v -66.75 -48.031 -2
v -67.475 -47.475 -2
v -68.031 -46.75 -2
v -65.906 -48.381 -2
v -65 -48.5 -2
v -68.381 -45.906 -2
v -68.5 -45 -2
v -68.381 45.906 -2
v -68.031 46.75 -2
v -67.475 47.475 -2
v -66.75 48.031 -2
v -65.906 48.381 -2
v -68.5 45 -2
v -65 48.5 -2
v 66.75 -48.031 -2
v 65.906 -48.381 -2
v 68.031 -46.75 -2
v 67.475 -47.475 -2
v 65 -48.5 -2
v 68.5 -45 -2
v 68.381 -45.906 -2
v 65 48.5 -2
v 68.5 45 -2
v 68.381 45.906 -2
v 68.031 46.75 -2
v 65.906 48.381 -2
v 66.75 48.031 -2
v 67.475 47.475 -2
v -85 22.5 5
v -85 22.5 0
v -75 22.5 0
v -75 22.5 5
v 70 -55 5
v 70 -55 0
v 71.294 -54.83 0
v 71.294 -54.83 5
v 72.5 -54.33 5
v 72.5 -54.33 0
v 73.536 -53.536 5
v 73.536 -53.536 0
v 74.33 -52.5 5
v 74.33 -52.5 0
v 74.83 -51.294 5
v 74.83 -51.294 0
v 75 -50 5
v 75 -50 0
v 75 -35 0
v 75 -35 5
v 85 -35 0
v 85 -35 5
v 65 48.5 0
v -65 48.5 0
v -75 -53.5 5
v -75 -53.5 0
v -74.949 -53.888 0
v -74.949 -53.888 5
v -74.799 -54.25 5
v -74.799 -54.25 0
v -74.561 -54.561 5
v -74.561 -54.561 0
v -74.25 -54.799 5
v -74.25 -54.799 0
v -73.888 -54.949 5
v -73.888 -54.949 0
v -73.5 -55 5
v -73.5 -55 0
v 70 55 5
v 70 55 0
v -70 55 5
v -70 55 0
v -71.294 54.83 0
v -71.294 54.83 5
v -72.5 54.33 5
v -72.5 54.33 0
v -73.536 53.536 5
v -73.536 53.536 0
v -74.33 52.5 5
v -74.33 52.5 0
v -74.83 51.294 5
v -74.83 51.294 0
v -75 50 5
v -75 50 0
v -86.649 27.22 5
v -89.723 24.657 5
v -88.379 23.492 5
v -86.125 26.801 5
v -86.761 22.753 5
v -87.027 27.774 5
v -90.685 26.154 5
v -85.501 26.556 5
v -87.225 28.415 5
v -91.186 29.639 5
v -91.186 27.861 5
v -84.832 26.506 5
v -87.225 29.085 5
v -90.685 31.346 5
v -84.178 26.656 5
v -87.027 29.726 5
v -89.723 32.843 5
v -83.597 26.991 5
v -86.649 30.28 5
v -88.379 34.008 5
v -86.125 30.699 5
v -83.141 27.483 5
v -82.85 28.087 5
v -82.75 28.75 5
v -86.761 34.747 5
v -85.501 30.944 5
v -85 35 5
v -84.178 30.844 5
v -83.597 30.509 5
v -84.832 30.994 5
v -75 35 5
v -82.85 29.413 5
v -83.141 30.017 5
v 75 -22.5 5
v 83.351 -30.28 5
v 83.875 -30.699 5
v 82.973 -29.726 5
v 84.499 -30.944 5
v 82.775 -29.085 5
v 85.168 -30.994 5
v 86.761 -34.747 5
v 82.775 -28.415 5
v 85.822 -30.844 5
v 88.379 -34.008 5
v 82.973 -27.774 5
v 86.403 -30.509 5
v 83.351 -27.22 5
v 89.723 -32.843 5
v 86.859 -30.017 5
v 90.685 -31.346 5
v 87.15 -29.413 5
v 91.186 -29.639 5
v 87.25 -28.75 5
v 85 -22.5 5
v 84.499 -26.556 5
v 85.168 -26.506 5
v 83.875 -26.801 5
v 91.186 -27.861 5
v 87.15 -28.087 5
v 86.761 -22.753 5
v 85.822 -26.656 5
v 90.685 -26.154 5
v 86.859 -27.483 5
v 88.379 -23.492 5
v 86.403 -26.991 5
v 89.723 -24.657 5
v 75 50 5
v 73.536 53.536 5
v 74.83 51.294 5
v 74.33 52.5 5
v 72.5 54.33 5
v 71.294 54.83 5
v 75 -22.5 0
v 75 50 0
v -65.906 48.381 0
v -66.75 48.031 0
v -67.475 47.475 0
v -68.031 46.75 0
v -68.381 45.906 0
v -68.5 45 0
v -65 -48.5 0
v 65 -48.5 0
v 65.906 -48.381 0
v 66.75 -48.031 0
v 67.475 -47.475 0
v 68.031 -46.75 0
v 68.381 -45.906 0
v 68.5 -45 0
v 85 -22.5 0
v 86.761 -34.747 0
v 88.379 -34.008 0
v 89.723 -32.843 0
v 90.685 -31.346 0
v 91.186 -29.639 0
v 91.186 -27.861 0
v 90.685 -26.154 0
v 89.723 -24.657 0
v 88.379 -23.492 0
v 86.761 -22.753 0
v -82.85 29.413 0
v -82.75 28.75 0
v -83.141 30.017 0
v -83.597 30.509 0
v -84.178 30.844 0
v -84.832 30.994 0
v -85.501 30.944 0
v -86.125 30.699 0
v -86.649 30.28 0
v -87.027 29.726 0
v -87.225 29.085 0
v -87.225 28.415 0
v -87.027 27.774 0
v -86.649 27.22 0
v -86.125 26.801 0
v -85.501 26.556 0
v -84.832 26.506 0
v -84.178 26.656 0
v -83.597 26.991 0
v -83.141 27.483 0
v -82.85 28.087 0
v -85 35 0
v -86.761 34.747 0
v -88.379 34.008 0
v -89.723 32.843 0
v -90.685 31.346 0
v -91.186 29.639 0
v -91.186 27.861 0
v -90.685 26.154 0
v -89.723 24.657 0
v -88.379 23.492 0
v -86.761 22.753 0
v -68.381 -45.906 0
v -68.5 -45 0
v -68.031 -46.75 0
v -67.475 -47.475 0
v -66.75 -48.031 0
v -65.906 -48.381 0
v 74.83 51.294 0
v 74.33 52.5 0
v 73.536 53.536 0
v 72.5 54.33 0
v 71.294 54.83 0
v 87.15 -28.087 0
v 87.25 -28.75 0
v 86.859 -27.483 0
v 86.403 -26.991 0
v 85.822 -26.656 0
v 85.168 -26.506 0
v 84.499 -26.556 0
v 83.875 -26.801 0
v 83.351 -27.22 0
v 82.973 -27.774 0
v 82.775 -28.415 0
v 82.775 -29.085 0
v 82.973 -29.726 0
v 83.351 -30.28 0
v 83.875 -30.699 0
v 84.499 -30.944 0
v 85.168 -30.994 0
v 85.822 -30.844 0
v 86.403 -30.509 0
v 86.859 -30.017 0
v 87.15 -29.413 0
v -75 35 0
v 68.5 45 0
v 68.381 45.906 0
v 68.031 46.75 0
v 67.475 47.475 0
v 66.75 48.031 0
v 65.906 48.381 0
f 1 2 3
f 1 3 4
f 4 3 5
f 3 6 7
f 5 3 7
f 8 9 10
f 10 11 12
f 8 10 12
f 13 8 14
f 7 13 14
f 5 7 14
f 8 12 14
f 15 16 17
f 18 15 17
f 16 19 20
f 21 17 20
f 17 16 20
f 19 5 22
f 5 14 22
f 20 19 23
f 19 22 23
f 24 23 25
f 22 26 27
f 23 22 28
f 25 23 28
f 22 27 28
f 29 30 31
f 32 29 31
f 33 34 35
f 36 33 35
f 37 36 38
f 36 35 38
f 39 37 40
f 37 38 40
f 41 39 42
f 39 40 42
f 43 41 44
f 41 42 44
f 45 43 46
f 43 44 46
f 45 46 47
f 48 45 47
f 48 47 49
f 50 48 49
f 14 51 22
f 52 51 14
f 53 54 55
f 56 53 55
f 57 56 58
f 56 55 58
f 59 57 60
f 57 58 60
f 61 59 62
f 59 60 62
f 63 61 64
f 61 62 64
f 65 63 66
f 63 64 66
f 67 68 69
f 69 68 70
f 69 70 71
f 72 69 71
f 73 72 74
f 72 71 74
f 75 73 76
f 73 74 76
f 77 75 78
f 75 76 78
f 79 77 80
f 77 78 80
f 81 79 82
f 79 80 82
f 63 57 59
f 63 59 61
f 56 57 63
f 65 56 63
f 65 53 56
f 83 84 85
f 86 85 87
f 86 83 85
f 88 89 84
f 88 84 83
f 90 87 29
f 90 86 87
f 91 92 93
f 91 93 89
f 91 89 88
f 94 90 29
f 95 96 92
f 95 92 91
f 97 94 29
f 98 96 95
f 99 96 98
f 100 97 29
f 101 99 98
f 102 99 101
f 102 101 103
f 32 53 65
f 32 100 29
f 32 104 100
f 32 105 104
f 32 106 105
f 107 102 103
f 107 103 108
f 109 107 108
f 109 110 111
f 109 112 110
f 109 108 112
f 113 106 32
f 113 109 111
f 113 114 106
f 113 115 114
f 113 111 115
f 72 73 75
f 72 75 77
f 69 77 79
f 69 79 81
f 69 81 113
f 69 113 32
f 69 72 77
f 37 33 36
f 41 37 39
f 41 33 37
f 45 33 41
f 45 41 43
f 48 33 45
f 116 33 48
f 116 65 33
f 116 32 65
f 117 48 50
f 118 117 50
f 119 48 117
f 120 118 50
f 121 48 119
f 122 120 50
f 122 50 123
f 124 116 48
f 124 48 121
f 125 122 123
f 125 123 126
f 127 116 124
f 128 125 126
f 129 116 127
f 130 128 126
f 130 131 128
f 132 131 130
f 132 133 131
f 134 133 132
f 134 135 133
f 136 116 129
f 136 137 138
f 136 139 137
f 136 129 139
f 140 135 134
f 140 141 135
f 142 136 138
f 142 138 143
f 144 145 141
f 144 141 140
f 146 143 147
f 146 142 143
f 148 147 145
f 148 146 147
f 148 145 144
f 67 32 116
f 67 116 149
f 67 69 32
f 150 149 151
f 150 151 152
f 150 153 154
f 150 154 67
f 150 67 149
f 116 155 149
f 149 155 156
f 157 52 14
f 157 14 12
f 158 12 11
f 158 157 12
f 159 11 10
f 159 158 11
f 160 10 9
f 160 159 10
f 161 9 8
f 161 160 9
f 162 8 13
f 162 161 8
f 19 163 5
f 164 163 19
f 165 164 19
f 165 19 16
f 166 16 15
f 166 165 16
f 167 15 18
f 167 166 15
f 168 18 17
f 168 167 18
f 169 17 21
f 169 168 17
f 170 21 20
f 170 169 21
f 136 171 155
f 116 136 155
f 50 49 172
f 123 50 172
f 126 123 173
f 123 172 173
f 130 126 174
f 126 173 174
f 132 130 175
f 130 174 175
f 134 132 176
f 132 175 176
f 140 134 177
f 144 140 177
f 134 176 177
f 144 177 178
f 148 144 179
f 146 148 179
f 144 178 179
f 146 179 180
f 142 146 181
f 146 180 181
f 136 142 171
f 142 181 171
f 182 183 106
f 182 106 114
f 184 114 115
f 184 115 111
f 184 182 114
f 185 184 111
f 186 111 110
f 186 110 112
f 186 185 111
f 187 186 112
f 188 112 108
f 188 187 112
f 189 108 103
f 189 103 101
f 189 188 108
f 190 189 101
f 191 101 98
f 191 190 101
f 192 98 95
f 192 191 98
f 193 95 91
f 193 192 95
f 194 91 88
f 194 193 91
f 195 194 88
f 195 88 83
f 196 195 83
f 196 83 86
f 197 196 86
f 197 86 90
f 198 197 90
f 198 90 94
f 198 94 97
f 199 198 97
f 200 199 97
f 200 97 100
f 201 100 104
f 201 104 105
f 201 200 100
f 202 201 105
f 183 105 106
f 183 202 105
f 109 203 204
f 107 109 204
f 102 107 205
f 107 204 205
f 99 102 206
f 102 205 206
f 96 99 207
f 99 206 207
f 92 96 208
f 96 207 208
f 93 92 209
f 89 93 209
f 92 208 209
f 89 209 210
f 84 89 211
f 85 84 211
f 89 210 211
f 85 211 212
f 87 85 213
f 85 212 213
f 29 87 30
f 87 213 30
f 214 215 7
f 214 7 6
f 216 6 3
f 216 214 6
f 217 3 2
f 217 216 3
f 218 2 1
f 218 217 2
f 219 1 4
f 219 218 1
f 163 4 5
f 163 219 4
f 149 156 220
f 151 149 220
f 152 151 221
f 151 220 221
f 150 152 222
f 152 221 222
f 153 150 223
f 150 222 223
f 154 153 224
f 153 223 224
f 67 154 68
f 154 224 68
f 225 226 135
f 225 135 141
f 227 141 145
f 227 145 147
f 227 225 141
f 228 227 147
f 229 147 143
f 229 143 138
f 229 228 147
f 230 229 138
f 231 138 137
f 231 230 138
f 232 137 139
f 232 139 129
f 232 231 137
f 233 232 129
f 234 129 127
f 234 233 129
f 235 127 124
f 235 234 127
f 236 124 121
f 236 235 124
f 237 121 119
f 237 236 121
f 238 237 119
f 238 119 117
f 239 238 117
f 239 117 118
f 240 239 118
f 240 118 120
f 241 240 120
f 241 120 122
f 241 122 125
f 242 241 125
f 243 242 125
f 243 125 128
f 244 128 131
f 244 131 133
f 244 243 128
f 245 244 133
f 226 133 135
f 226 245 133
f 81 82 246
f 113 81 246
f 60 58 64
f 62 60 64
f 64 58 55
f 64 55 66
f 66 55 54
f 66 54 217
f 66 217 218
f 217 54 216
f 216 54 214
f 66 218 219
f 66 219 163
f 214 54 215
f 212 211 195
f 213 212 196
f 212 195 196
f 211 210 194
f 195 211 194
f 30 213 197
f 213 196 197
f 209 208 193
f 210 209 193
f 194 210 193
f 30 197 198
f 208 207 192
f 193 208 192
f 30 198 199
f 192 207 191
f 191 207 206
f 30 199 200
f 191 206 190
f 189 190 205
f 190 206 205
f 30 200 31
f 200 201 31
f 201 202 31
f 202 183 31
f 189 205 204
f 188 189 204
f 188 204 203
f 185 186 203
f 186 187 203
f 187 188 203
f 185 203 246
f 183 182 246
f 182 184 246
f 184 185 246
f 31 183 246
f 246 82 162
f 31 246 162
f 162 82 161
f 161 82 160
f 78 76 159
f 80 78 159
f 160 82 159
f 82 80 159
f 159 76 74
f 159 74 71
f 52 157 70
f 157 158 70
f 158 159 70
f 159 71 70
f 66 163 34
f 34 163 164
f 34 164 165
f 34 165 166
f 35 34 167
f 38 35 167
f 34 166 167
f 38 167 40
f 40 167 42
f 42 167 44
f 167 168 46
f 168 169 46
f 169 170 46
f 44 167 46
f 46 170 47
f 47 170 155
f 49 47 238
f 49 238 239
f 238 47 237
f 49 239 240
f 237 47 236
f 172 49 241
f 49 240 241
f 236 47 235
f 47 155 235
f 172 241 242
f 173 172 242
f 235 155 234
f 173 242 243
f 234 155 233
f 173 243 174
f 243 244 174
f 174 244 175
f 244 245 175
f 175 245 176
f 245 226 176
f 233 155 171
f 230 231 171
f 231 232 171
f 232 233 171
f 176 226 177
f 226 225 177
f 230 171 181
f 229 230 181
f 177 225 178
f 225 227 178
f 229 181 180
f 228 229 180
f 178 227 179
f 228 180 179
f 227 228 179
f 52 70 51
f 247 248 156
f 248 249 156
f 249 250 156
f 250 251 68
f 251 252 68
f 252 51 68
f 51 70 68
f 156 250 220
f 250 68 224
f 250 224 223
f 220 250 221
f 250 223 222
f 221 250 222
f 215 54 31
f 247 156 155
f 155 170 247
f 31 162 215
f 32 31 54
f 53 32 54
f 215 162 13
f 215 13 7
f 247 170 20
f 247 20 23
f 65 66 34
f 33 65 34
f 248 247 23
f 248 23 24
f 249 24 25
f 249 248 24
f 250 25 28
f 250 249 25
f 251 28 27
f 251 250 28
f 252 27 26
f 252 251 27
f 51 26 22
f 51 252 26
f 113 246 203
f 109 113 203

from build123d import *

# Parameters (mm, degrees)
SKETCH1_R           = 2.25
BOSS_EXTRUDE1_DEPTH = 5
BOSS_EXTRUDE2_DEPTH = 2


with BuildPart() as part:
    # Sketch1 → Boss-Extrude1 (new body)
    with BuildSketch(Plane.XY):
        with BuildLine():
            Line((-75, 35), (-85, 35))
            ThreePointArc((-85, 35), (-91.25, 28.75), (-85, 22.5))
            Line((-85, 22.5), (-75, 22.5))
            Line((-75, 22.5), (-75, -53.5))
            ThreePointArc((-75, -53.5), (-74.560660172, -54.560660172), (-73.5, -55))
            Line((-73.5, -55), (70, -55))
            ThreePointArc((70, -55), (73.535533906, -53.535533906), (75, -50))
            Line((75, -50), (75, -35))
            Line((75, -35), (85, -35))
            ThreePointArc((85, -35), (91.25, -28.75), (85, -22.5))
            Line((85, -22.5), (75, -22.5))
            Line((75, -22.5), (75, 50))
            ThreePointArc((75, 50), (73.535533906, 53.535533906), (70, 55))
            Line((70, 55), (-70, 55))
            ThreePointArc((-70, 55), (-73.535533906, 53.535533906), (-75, 50))
            Line((-75, 50), (-75, 35))
        make_face()
        with Locations((-85, 28.75)):
            Circle(SKETCH1_R, mode=Mode.SUBTRACT)
        with Locations((85, -28.75)):
            Circle(SKETCH1_R, mode=Mode.SUBTRACT)
    extrude(amount=BOSS_EXTRUDE1_DEPTH)

    # Sketch3 → Boss-Extrude2 (add)
    with BuildSketch(Plane(origin=(0, 0, 0), x_dir=(-1, 0, 0), z_dir=(0, 0, -1))):
        with BuildLine():
            Line((-68.5, -45), (-68.5, 45))
            ThreePointArc((-68.5, 45), (-67.474873734, 47.474873734), (-65, 48.5))
            Line((-65, 48.5), (65, 48.5))
            ThreePointArc((65, 48.5), (67.474873734, 47.474873734), (68.5, 45))
            Line((68.5, 45), (68.5, -45))
            ThreePointArc((68.5, -45), (67.474873734, -47.474873734), (65, -48.5))
            Line((65, -48.5), (-65, -48.5))
            ThreePointArc((-65, -48.5), (-67.474873734, -47.474873734), (-68.5, -45))
        make_face()
    extrude(amount=BOSS_EXTRUDE2_DEPTH)


solid = part.part
